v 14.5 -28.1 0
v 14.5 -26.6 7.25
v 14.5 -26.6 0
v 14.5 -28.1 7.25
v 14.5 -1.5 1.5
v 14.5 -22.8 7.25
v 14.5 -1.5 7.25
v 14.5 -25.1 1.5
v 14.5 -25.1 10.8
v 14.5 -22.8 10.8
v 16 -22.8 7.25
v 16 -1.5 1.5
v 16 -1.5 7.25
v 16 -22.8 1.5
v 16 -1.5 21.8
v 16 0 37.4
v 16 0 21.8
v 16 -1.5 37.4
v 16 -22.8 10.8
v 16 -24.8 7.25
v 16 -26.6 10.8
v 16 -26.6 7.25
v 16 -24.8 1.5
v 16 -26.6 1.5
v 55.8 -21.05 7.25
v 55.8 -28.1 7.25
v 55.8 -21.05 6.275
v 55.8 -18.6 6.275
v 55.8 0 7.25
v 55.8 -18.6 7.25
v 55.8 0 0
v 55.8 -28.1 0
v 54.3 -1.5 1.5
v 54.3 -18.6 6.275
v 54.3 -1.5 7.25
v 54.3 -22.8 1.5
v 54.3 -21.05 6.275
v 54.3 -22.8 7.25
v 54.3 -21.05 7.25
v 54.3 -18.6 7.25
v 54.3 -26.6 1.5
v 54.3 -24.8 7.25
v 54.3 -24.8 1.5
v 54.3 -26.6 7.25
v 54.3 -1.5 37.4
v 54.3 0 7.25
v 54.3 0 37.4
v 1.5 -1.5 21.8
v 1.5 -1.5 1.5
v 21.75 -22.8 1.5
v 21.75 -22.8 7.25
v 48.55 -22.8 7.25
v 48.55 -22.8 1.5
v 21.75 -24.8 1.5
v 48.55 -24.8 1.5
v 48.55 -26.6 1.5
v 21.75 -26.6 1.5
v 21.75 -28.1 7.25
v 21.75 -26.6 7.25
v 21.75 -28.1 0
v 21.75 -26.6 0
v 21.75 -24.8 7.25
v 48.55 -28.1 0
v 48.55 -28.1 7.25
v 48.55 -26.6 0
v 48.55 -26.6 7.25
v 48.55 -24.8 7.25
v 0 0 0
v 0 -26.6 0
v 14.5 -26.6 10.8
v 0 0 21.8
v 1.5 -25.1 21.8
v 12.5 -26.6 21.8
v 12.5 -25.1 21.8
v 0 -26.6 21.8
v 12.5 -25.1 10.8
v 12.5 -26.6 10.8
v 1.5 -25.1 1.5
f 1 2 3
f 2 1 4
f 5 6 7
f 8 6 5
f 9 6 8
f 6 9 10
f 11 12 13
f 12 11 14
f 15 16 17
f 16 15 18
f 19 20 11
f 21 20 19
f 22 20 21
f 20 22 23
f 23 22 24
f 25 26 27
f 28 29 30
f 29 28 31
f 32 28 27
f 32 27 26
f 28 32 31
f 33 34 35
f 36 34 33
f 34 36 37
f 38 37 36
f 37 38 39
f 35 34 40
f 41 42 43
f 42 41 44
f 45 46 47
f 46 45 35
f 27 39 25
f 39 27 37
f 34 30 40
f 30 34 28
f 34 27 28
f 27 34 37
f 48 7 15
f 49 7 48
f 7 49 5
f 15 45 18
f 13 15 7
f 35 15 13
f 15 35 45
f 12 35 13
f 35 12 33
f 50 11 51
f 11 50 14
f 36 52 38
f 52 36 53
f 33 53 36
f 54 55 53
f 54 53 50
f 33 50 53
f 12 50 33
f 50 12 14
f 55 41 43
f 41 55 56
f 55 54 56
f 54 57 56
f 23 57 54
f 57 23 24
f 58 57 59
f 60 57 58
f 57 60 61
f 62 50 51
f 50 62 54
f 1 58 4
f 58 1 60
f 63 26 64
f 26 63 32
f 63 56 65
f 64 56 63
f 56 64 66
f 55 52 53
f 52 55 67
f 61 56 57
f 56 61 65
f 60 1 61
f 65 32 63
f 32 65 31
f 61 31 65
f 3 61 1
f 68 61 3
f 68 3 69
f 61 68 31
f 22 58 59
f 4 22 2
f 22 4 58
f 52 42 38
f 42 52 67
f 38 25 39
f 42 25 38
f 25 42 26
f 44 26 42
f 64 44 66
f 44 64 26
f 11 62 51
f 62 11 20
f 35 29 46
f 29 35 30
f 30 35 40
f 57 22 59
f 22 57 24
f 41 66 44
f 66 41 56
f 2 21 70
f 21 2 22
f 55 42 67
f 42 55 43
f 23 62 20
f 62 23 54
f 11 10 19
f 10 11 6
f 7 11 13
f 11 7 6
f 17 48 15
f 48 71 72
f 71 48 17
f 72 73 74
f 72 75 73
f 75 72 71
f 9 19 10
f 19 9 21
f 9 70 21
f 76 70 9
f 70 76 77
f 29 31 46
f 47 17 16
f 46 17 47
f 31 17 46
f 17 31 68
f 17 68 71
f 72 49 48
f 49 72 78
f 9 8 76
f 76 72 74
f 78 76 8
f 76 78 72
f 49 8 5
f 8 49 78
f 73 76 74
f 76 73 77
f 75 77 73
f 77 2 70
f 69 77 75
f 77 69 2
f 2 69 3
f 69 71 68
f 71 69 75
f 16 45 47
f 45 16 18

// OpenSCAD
PM25_X = 38.3;
PM25_Y = 50.1;
PM25_Z = 21.3;
WALL_SIZE = 1.5;
TAB_X = 5.75;
TAB_Y = 5.75;
PCB_SPACER = 2;
PCB_THICKNESS = 1.8;
BRIM = TAB_X;
CABLE_BOX_X = 13;
BIG_VENT_CENTER = 35.9;

// JST cable cutout
JST_DISTANCE_FROM_EDGE = 9.3;
JST_WIDTH = 11;
CABLE_SPACE = 2;

module leftCutout() {
  translate([-WALL_SIZE, BRIM, 0])
    linear_extrude(PM25_Z)
    square(size = [WALL_SIZE, PM25_Y - (2 * BRIM)]);

  translate([-WALL_SIZE, JST_DISTANCE_FROM_EDGE, 0])
    linear_extrude(PM25_Z + PCB_THICKNESS + PCB_SPACER)
    square(size = [WALL_SIZE, JST_WIDTH]);
}

module rightCutout() {
  translate([PM25_X, BRIM, -WALL_SIZE])
    linear_extrude(PM25_Z + PCB_THICKNESS + PCB_SPACER + (WALL_SIZE * 2))
    square(size = [WALL_SIZE, PM25_Y - (2 * BRIM)]);
}

module bottomCutout() {
  translate([-WALL_SIZE, BRIM, -WALL_SIZE])
    linear_extrude(WALL_SIZE)
    square(size = [PM25_X + (WALL_SIZE * 2), PM25_Y - (2 * BRIM)]);
}

module pcbCutout() {
  translate([TAB_X, 0, PM25_Z])
    linear_extrude(PCB_SPACER + PCB_THICKNESS + WALL_SIZE)
    square(size = [PM25_X - (TAB_X * 2), PM25_Y]);

  translate([TAB_X, -WALL_SIZE, PM25_Z + PCB_SPACER + PCB_THICKNESS])
    linear_extrude(WALL_SIZE)
    square(size = [PM25_X - (TAB_X * 2), PM25_Y + (WALL_SIZE * 2)]);

  translate([0, TAB_Y, PM25_Z])
    linear_extrude(PCB_SPACER + PCB_THICKNESS + WALL_SIZE)
    square(size = [PM25_X, PM25_Y - (TAB_Y * 2)]);

  translate([-WALL_SIZE, TAB_Y, PM25_Z + PCB_SPACER + PCB_THICKNESS])
    linear_extrude(WALL_SIZE)
    square(size = [PM25_X + (WALL_SIZE * 2), PM25_Y - (TAB_Y * 2)]);

  translate([0, 0, PM25_Z + PCB_SPACER])
    linear_extrude(PCB_THICKNESS)
    square(size = [PM25_X, PM25_Y]);
}

module pmcutout() {
  port_d = 2.45;
  fan_r = 9;

  jst_height = 4.9;
  jst_len = 17;
  translate([-WALL_SIZE, PM25_Y - jst_len - 5.5, (PM25_Z / 2) + jst_height / 2])
  rotate([0, 90, 0])
    color("blue")
    linear_extrude(WALL_SIZE)
    square(size = [jst_height, jst_len]);

  translate([PM25_X, BIG_VENT_CENTER, PM25_Z / 2])
  rotate([0, 90, 0])
    linear_extrude(WALL_SIZE)
    circle(r = fan_r);

  translate([PM25_X, 6 - (port_d / 2), PM25_Z - (4.2 - port_d)])
    rotate([0, 90, 0])
    color("green")
    linear_extrude(WALL_SIZE)
    square(size = [port_d, 12.0 + port_d]);

  linear_extrude(PM25_Z)
    square(size = [PM25_X, PM25_Y]);
}

module pmcase() {
  translate([CABLE_BOX_X + WALL_SIZE, 0, 0]) {
    translate([WALL_SIZE, WALL_SIZE, WALL_SIZE])
      difference() {
        translate([-WALL_SIZE, -WALL_SIZE, -WALL_SIZE])
          linear_extrude(PM25_Z + (WALL_SIZE * 2) + PCB_SPACER + PCB_THICKNESS)
          square(size = [PM25_X + (WALL_SIZE * 2), PM25_Y + (WALL_SIZE * 2)]);
        pmcutout();
        pcbCutout();
        //bottomCutout();
        leftCutout();
        rightCutout();
      }
    translate([-(CABLE_BOX_X + WALL_SIZE), 0, 0])
      cablecase();
  }
}

module cablecaseCutout() {
  height = PM25_Z + PCB_SPACER + PCB_THICKNESS - WALL_SIZE;
  linear_extrude(height)
    square(size = [CABLE_BOX_X, PM25_Y]);

  translate([CABLE_BOX_X - CABLE_SPACE, JST_DISTANCE_FROM_EDGE, height])
    linear_extrude(WALL_SIZE)
    square(size = [CABLE_SPACE, JST_WIDTH]);
}

module cablecase() {
  translate([WALL_SIZE, WALL_SIZE, WALL_SIZE])
  difference() {
    translate([-WALL_SIZE, -WALL_SIZE, -WALL_SIZE])
      linear_extrude(PM25_Z + PCB_SPACER + PCB_THICKNESS + WALL_SIZE)
      square(size = [CABLE_BOX_X + WALL_SIZE, PM25_Y + (WALL_SIZE * 2)]);
    cablecaseCutout();
  }
}

module Bottom() {
  difference() {
    pmcase();

    translate([CABLE_BOX_X + WALL_SIZE, (BIG_VENT_CENTER + WALL_SIZE), 0])
      color("blue")
      linear_extrude(PM25_Z + WALL_SIZE * 2 + PCB_SPACER + PCB_THICKNESS)
      square(size = [PM25_X + (WALL_SIZE * 2), (PM25_Y - BIG_VENT_CENTER + WALL_SIZE)]);

    translate([0, JST_DISTANCE_FROM_EDGE + WALL_SIZE + JST_WIDTH, 0])
      linear_extrude(PM25_Z + WALL_SIZE * 2 + PCB_SPACER + PCB_THICKNESS)
      square(size = [CABLE_BOX_X + (WALL_SIZE * 2), PM25_Y + (WALL_SIZE * 2)]);

  }
}

module TopSlice() {
    translate([CABLE_BOX_X + (WALL_SIZE * 2), 0, 0])
      color("blue")
      linear_extrude(PM25_Z + WALL_SIZE * 2 + PCB_SPACER + PCB_THICKNESS)
      square(size = [PM25_X + WALL_SIZE, BIG_VENT_CENTER + WALL_SIZE]);

      linear_extrude(PM25_Z + WALL_SIZE * 2 + PCB_SPACER + PCB_THICKNESS)
      square(size = [CABLE_BOX_X + (WALL_SIZE * 2), WALL_SIZE + JST_DISTANCE_FROM_EDGE + JST_WIDTH]);

}

module Top() {
  difference() {
    pmcase();
    TopSlice();
  }
}

rendering = "full";
if (rendering == "full") {
  rotate([90, 0, 0])
    Bottom();
}

if (rendering == "top") {
  rotate([270, 0, 0])
    Top();
}

if (rendering == "bottom") {
  rotate([90, 0, 0])
    Bottom();
}
//Top();
//rotate([90, 0, 0])
//Bottom();
